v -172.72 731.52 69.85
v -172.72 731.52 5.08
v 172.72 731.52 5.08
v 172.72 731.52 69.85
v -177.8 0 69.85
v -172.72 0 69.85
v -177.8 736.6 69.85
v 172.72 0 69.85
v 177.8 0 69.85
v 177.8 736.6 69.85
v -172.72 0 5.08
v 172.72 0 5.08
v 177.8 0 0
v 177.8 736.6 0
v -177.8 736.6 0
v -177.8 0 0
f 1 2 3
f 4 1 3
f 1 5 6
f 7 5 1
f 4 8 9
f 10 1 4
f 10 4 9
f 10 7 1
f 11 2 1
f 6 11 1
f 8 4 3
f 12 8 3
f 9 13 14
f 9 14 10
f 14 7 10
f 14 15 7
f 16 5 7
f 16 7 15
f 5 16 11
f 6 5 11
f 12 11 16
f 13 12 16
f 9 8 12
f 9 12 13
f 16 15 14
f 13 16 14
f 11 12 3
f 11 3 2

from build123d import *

# Parameters (mm, degrees)
F1_DEPTH = 736.6
F2_W     = 345.44
F2_H     = 5.08
F3_DEPTH = 64.77


with BuildPart() as f1:
    # F0 (on Front) → F1 (new body)
    with BuildSketch(Plane.XZ):
        Polygon((-172.72, 69.85), (-177.8, 69.85), (-177.8, 0), (177.8, 0), (177.8, 69.85), (172.72, 69.85), (172.72, 5.08), (-172.72, 5.08), align=None)
    extrude(amount=-F1_DEPTH)

    # F2 (on face) → F3 (join, through all)
    with BuildSketch(Plane.XY.offset(5.08)):
        with Locations((0, 734.06)):
            Rectangle(F2_W, F2_H)
    extrude(amount=F3_DEPTH)


solid = f1.part
